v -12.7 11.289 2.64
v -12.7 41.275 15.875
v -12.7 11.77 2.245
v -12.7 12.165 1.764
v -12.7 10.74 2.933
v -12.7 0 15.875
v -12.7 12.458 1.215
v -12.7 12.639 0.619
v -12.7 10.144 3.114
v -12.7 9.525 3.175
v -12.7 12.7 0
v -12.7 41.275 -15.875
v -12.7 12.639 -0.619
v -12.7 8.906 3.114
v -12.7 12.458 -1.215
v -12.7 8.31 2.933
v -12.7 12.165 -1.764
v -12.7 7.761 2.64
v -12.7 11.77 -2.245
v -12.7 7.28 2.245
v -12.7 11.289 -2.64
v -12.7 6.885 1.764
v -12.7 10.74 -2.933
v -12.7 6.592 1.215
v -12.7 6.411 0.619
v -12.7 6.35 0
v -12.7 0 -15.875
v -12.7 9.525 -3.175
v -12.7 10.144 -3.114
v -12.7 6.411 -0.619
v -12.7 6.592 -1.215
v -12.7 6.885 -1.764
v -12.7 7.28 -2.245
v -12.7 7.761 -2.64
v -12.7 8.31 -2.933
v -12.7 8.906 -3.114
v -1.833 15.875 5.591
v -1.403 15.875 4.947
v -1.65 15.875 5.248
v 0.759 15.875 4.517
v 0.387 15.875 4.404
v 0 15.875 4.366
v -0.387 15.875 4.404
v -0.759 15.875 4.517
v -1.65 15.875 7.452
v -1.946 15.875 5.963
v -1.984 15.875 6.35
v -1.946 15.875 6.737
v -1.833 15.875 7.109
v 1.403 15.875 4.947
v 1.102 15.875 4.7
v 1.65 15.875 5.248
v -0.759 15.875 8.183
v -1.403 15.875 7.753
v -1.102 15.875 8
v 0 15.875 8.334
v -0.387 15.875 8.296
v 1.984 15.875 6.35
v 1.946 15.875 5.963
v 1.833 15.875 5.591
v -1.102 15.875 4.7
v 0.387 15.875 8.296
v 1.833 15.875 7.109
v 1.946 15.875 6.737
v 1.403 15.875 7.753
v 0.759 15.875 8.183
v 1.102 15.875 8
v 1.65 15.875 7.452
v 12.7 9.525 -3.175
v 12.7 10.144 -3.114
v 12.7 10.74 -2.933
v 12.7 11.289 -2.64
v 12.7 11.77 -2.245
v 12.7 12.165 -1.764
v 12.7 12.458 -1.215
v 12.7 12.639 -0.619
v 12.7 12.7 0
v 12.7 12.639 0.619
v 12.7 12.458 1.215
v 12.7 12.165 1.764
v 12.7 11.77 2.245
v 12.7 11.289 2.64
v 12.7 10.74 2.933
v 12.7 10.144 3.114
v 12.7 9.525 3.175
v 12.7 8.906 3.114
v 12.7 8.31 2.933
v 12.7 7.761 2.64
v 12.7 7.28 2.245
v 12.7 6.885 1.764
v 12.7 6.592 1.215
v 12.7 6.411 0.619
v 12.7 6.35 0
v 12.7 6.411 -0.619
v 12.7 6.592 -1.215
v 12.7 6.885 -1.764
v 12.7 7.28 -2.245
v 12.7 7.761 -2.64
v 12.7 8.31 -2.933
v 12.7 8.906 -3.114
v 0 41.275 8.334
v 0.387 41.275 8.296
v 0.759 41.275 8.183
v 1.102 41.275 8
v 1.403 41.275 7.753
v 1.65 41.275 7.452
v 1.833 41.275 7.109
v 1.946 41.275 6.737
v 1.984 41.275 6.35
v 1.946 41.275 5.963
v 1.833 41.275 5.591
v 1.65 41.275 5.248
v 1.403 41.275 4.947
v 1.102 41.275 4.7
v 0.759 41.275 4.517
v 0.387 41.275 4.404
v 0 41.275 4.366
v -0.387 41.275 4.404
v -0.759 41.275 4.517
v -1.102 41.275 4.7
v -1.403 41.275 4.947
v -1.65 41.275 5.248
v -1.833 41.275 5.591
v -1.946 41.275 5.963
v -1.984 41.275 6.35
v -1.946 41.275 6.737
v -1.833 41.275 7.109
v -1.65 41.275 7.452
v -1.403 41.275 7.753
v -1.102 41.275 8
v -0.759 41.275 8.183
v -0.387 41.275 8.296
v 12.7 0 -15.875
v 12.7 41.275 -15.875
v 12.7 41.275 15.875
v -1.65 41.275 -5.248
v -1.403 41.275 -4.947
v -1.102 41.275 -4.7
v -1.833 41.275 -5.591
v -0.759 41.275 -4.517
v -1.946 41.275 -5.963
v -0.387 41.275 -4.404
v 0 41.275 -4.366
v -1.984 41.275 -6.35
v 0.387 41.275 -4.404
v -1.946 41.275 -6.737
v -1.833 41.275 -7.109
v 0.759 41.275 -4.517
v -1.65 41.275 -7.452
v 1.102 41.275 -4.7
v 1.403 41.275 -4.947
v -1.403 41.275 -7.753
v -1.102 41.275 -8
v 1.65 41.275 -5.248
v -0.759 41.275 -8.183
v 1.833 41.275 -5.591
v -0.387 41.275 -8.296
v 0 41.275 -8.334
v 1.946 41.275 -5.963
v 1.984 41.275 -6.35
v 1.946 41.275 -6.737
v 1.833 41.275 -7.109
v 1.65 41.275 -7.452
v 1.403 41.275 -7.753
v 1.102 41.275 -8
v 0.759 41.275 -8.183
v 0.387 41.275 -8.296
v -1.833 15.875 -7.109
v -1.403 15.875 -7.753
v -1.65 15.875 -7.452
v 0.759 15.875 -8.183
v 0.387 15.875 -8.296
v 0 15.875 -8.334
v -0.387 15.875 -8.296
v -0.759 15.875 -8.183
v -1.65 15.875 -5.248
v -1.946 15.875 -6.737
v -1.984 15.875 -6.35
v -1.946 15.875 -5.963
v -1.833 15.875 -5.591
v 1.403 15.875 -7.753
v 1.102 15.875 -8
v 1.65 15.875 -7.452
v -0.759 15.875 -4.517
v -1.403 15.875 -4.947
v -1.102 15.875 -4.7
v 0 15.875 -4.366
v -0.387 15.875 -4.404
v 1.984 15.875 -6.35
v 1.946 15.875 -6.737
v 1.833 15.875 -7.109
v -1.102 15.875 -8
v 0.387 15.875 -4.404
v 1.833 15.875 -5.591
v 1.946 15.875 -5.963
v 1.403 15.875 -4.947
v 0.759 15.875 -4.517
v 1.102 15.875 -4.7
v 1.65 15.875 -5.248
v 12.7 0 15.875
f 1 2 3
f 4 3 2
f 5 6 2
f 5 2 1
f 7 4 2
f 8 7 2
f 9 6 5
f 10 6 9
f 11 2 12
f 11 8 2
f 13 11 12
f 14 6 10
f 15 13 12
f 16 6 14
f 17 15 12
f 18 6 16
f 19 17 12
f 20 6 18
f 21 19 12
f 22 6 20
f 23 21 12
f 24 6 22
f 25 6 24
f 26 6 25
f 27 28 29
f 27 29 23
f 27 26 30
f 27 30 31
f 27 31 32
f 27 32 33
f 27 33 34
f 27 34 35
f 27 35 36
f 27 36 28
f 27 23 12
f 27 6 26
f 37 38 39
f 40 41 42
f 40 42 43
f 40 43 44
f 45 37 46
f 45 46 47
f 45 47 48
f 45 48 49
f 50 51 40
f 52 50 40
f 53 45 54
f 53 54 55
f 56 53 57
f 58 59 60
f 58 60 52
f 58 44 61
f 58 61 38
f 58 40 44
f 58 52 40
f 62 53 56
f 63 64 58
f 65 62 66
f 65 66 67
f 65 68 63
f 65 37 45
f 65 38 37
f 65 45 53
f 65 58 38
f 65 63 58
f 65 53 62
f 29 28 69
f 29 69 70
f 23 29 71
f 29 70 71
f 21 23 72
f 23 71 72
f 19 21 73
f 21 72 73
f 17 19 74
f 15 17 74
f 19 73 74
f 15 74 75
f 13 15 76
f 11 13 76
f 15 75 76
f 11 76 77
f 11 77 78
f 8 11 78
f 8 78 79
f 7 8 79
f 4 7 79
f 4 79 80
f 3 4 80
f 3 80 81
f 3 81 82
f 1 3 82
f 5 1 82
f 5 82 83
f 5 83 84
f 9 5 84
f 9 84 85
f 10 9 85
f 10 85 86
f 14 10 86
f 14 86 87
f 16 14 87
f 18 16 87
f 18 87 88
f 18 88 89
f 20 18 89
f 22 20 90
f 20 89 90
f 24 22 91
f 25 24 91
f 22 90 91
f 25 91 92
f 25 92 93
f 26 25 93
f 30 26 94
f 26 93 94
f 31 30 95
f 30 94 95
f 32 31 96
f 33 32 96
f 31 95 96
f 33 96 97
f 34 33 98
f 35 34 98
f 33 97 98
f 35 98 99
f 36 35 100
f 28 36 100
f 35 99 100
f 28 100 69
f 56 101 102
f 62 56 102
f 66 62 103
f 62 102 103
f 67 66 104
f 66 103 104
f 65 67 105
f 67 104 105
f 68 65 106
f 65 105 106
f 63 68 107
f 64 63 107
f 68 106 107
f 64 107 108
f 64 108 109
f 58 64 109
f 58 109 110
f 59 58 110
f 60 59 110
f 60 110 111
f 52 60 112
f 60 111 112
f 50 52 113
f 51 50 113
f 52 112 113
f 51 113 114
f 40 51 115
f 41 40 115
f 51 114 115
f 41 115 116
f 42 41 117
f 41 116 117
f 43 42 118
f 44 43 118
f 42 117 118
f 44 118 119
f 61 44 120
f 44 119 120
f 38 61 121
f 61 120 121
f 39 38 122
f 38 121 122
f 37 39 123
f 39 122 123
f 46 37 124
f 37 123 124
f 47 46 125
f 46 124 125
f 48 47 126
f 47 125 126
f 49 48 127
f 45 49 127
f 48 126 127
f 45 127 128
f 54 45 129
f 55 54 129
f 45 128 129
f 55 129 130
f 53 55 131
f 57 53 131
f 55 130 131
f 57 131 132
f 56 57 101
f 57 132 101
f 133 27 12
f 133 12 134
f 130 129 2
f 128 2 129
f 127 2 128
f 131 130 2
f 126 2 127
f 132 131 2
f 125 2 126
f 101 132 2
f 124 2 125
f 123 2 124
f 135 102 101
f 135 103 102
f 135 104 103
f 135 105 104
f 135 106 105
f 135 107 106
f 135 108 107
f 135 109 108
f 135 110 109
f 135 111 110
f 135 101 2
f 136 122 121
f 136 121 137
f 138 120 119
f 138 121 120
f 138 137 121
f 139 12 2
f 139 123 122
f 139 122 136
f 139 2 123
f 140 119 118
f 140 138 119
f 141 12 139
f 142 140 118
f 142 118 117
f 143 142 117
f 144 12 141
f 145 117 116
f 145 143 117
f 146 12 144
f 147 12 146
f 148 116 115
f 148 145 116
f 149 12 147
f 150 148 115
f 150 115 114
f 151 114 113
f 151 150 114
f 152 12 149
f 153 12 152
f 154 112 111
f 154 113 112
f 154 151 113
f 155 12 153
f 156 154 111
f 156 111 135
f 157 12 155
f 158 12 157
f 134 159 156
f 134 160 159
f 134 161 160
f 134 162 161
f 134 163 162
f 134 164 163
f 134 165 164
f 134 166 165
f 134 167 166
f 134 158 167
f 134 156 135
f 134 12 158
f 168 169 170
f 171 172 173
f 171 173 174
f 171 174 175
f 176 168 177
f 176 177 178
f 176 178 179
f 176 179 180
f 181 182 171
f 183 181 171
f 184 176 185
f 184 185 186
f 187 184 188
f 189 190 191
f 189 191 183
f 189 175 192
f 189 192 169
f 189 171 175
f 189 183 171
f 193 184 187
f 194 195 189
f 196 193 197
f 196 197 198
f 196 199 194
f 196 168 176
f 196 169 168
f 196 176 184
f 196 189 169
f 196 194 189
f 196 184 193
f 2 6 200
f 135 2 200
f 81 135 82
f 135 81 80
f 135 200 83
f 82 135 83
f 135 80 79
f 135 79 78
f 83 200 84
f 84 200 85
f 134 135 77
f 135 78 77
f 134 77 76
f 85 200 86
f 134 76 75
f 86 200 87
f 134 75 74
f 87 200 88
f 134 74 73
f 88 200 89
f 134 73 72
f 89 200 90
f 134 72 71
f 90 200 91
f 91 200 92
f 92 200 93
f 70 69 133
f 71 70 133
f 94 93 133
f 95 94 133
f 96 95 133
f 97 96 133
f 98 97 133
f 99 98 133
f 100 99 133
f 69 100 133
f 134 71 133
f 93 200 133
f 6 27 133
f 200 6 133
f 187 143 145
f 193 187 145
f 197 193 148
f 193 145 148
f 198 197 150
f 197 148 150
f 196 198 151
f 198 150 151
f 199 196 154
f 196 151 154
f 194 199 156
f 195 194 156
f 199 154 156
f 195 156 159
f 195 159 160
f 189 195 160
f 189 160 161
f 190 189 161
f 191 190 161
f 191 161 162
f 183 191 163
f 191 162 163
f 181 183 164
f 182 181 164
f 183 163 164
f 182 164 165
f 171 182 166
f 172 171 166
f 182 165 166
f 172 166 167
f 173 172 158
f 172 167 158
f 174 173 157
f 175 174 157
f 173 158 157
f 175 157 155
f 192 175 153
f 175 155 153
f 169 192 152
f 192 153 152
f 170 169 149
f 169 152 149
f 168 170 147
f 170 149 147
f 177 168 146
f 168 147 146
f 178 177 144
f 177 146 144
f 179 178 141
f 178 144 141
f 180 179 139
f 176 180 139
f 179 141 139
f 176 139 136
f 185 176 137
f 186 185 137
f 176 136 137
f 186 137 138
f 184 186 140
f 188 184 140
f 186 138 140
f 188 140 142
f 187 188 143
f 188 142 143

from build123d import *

# Parameters (mm, degrees)
SKETCH1_W                      = 25.4
SKETCH1_H                      = 31.75
BOSS_EXTRUDE1_DEPTH            = 41.275
SKETCH2_R                      = 3.175
F_1_4_THROUGH_HOLE_DEPTH       = 51.998051433
SKETCH3_R                      = 1.984375
F_10_32_THREADED_HOLES_1_DEPTH = 25.4


with BuildPart() as part:
    # Sketch1 → Boss-Extrude1 (new body)
    with BuildSketch(Plane(origin=(0, 0, 0), x_dir=(1, 0, 0), z_dir=(0, 1, 0))):
        Rectangle(SKETCH1_W, SKETCH1_H)
    extrude(amount=BOSS_EXTRUDE1_DEPTH)

    # Sketch2 → 1/4" Through Hole (cut, through all)
    with BuildSketch(Plane(origin=(12.7, 0, 0), x_dir=(0, 0, -1), z_dir=(1, 0, 0))):
        with Locations((0, 9.525)):
            Circle(SKETCH2_R)
    extrude(amount=-F_1_4_THROUGH_HOLE_DEPTH, mode=Mode.SUBTRACT)

    # Sketch3 → 10-32 Threaded Holes (1") (cut)
    with BuildSketch(Plane(origin=(0, 41.275, 0), x_dir=(1, 0, 0), z_dir=(0, 1, 0))):
        with Locations(Location((0, 6.35, 0), (0, 0, 270))):
            Circle(SKETCH3_R)
        with Locations(Location((0, -6.35, 0), (0, 0, 270))):
            Circle(SKETCH3_R)
    extrude(amount=-F_10_32_THREADED_HOLES_1_DEPTH, mode=Mode.SUBTRACT)


solid = part.part
